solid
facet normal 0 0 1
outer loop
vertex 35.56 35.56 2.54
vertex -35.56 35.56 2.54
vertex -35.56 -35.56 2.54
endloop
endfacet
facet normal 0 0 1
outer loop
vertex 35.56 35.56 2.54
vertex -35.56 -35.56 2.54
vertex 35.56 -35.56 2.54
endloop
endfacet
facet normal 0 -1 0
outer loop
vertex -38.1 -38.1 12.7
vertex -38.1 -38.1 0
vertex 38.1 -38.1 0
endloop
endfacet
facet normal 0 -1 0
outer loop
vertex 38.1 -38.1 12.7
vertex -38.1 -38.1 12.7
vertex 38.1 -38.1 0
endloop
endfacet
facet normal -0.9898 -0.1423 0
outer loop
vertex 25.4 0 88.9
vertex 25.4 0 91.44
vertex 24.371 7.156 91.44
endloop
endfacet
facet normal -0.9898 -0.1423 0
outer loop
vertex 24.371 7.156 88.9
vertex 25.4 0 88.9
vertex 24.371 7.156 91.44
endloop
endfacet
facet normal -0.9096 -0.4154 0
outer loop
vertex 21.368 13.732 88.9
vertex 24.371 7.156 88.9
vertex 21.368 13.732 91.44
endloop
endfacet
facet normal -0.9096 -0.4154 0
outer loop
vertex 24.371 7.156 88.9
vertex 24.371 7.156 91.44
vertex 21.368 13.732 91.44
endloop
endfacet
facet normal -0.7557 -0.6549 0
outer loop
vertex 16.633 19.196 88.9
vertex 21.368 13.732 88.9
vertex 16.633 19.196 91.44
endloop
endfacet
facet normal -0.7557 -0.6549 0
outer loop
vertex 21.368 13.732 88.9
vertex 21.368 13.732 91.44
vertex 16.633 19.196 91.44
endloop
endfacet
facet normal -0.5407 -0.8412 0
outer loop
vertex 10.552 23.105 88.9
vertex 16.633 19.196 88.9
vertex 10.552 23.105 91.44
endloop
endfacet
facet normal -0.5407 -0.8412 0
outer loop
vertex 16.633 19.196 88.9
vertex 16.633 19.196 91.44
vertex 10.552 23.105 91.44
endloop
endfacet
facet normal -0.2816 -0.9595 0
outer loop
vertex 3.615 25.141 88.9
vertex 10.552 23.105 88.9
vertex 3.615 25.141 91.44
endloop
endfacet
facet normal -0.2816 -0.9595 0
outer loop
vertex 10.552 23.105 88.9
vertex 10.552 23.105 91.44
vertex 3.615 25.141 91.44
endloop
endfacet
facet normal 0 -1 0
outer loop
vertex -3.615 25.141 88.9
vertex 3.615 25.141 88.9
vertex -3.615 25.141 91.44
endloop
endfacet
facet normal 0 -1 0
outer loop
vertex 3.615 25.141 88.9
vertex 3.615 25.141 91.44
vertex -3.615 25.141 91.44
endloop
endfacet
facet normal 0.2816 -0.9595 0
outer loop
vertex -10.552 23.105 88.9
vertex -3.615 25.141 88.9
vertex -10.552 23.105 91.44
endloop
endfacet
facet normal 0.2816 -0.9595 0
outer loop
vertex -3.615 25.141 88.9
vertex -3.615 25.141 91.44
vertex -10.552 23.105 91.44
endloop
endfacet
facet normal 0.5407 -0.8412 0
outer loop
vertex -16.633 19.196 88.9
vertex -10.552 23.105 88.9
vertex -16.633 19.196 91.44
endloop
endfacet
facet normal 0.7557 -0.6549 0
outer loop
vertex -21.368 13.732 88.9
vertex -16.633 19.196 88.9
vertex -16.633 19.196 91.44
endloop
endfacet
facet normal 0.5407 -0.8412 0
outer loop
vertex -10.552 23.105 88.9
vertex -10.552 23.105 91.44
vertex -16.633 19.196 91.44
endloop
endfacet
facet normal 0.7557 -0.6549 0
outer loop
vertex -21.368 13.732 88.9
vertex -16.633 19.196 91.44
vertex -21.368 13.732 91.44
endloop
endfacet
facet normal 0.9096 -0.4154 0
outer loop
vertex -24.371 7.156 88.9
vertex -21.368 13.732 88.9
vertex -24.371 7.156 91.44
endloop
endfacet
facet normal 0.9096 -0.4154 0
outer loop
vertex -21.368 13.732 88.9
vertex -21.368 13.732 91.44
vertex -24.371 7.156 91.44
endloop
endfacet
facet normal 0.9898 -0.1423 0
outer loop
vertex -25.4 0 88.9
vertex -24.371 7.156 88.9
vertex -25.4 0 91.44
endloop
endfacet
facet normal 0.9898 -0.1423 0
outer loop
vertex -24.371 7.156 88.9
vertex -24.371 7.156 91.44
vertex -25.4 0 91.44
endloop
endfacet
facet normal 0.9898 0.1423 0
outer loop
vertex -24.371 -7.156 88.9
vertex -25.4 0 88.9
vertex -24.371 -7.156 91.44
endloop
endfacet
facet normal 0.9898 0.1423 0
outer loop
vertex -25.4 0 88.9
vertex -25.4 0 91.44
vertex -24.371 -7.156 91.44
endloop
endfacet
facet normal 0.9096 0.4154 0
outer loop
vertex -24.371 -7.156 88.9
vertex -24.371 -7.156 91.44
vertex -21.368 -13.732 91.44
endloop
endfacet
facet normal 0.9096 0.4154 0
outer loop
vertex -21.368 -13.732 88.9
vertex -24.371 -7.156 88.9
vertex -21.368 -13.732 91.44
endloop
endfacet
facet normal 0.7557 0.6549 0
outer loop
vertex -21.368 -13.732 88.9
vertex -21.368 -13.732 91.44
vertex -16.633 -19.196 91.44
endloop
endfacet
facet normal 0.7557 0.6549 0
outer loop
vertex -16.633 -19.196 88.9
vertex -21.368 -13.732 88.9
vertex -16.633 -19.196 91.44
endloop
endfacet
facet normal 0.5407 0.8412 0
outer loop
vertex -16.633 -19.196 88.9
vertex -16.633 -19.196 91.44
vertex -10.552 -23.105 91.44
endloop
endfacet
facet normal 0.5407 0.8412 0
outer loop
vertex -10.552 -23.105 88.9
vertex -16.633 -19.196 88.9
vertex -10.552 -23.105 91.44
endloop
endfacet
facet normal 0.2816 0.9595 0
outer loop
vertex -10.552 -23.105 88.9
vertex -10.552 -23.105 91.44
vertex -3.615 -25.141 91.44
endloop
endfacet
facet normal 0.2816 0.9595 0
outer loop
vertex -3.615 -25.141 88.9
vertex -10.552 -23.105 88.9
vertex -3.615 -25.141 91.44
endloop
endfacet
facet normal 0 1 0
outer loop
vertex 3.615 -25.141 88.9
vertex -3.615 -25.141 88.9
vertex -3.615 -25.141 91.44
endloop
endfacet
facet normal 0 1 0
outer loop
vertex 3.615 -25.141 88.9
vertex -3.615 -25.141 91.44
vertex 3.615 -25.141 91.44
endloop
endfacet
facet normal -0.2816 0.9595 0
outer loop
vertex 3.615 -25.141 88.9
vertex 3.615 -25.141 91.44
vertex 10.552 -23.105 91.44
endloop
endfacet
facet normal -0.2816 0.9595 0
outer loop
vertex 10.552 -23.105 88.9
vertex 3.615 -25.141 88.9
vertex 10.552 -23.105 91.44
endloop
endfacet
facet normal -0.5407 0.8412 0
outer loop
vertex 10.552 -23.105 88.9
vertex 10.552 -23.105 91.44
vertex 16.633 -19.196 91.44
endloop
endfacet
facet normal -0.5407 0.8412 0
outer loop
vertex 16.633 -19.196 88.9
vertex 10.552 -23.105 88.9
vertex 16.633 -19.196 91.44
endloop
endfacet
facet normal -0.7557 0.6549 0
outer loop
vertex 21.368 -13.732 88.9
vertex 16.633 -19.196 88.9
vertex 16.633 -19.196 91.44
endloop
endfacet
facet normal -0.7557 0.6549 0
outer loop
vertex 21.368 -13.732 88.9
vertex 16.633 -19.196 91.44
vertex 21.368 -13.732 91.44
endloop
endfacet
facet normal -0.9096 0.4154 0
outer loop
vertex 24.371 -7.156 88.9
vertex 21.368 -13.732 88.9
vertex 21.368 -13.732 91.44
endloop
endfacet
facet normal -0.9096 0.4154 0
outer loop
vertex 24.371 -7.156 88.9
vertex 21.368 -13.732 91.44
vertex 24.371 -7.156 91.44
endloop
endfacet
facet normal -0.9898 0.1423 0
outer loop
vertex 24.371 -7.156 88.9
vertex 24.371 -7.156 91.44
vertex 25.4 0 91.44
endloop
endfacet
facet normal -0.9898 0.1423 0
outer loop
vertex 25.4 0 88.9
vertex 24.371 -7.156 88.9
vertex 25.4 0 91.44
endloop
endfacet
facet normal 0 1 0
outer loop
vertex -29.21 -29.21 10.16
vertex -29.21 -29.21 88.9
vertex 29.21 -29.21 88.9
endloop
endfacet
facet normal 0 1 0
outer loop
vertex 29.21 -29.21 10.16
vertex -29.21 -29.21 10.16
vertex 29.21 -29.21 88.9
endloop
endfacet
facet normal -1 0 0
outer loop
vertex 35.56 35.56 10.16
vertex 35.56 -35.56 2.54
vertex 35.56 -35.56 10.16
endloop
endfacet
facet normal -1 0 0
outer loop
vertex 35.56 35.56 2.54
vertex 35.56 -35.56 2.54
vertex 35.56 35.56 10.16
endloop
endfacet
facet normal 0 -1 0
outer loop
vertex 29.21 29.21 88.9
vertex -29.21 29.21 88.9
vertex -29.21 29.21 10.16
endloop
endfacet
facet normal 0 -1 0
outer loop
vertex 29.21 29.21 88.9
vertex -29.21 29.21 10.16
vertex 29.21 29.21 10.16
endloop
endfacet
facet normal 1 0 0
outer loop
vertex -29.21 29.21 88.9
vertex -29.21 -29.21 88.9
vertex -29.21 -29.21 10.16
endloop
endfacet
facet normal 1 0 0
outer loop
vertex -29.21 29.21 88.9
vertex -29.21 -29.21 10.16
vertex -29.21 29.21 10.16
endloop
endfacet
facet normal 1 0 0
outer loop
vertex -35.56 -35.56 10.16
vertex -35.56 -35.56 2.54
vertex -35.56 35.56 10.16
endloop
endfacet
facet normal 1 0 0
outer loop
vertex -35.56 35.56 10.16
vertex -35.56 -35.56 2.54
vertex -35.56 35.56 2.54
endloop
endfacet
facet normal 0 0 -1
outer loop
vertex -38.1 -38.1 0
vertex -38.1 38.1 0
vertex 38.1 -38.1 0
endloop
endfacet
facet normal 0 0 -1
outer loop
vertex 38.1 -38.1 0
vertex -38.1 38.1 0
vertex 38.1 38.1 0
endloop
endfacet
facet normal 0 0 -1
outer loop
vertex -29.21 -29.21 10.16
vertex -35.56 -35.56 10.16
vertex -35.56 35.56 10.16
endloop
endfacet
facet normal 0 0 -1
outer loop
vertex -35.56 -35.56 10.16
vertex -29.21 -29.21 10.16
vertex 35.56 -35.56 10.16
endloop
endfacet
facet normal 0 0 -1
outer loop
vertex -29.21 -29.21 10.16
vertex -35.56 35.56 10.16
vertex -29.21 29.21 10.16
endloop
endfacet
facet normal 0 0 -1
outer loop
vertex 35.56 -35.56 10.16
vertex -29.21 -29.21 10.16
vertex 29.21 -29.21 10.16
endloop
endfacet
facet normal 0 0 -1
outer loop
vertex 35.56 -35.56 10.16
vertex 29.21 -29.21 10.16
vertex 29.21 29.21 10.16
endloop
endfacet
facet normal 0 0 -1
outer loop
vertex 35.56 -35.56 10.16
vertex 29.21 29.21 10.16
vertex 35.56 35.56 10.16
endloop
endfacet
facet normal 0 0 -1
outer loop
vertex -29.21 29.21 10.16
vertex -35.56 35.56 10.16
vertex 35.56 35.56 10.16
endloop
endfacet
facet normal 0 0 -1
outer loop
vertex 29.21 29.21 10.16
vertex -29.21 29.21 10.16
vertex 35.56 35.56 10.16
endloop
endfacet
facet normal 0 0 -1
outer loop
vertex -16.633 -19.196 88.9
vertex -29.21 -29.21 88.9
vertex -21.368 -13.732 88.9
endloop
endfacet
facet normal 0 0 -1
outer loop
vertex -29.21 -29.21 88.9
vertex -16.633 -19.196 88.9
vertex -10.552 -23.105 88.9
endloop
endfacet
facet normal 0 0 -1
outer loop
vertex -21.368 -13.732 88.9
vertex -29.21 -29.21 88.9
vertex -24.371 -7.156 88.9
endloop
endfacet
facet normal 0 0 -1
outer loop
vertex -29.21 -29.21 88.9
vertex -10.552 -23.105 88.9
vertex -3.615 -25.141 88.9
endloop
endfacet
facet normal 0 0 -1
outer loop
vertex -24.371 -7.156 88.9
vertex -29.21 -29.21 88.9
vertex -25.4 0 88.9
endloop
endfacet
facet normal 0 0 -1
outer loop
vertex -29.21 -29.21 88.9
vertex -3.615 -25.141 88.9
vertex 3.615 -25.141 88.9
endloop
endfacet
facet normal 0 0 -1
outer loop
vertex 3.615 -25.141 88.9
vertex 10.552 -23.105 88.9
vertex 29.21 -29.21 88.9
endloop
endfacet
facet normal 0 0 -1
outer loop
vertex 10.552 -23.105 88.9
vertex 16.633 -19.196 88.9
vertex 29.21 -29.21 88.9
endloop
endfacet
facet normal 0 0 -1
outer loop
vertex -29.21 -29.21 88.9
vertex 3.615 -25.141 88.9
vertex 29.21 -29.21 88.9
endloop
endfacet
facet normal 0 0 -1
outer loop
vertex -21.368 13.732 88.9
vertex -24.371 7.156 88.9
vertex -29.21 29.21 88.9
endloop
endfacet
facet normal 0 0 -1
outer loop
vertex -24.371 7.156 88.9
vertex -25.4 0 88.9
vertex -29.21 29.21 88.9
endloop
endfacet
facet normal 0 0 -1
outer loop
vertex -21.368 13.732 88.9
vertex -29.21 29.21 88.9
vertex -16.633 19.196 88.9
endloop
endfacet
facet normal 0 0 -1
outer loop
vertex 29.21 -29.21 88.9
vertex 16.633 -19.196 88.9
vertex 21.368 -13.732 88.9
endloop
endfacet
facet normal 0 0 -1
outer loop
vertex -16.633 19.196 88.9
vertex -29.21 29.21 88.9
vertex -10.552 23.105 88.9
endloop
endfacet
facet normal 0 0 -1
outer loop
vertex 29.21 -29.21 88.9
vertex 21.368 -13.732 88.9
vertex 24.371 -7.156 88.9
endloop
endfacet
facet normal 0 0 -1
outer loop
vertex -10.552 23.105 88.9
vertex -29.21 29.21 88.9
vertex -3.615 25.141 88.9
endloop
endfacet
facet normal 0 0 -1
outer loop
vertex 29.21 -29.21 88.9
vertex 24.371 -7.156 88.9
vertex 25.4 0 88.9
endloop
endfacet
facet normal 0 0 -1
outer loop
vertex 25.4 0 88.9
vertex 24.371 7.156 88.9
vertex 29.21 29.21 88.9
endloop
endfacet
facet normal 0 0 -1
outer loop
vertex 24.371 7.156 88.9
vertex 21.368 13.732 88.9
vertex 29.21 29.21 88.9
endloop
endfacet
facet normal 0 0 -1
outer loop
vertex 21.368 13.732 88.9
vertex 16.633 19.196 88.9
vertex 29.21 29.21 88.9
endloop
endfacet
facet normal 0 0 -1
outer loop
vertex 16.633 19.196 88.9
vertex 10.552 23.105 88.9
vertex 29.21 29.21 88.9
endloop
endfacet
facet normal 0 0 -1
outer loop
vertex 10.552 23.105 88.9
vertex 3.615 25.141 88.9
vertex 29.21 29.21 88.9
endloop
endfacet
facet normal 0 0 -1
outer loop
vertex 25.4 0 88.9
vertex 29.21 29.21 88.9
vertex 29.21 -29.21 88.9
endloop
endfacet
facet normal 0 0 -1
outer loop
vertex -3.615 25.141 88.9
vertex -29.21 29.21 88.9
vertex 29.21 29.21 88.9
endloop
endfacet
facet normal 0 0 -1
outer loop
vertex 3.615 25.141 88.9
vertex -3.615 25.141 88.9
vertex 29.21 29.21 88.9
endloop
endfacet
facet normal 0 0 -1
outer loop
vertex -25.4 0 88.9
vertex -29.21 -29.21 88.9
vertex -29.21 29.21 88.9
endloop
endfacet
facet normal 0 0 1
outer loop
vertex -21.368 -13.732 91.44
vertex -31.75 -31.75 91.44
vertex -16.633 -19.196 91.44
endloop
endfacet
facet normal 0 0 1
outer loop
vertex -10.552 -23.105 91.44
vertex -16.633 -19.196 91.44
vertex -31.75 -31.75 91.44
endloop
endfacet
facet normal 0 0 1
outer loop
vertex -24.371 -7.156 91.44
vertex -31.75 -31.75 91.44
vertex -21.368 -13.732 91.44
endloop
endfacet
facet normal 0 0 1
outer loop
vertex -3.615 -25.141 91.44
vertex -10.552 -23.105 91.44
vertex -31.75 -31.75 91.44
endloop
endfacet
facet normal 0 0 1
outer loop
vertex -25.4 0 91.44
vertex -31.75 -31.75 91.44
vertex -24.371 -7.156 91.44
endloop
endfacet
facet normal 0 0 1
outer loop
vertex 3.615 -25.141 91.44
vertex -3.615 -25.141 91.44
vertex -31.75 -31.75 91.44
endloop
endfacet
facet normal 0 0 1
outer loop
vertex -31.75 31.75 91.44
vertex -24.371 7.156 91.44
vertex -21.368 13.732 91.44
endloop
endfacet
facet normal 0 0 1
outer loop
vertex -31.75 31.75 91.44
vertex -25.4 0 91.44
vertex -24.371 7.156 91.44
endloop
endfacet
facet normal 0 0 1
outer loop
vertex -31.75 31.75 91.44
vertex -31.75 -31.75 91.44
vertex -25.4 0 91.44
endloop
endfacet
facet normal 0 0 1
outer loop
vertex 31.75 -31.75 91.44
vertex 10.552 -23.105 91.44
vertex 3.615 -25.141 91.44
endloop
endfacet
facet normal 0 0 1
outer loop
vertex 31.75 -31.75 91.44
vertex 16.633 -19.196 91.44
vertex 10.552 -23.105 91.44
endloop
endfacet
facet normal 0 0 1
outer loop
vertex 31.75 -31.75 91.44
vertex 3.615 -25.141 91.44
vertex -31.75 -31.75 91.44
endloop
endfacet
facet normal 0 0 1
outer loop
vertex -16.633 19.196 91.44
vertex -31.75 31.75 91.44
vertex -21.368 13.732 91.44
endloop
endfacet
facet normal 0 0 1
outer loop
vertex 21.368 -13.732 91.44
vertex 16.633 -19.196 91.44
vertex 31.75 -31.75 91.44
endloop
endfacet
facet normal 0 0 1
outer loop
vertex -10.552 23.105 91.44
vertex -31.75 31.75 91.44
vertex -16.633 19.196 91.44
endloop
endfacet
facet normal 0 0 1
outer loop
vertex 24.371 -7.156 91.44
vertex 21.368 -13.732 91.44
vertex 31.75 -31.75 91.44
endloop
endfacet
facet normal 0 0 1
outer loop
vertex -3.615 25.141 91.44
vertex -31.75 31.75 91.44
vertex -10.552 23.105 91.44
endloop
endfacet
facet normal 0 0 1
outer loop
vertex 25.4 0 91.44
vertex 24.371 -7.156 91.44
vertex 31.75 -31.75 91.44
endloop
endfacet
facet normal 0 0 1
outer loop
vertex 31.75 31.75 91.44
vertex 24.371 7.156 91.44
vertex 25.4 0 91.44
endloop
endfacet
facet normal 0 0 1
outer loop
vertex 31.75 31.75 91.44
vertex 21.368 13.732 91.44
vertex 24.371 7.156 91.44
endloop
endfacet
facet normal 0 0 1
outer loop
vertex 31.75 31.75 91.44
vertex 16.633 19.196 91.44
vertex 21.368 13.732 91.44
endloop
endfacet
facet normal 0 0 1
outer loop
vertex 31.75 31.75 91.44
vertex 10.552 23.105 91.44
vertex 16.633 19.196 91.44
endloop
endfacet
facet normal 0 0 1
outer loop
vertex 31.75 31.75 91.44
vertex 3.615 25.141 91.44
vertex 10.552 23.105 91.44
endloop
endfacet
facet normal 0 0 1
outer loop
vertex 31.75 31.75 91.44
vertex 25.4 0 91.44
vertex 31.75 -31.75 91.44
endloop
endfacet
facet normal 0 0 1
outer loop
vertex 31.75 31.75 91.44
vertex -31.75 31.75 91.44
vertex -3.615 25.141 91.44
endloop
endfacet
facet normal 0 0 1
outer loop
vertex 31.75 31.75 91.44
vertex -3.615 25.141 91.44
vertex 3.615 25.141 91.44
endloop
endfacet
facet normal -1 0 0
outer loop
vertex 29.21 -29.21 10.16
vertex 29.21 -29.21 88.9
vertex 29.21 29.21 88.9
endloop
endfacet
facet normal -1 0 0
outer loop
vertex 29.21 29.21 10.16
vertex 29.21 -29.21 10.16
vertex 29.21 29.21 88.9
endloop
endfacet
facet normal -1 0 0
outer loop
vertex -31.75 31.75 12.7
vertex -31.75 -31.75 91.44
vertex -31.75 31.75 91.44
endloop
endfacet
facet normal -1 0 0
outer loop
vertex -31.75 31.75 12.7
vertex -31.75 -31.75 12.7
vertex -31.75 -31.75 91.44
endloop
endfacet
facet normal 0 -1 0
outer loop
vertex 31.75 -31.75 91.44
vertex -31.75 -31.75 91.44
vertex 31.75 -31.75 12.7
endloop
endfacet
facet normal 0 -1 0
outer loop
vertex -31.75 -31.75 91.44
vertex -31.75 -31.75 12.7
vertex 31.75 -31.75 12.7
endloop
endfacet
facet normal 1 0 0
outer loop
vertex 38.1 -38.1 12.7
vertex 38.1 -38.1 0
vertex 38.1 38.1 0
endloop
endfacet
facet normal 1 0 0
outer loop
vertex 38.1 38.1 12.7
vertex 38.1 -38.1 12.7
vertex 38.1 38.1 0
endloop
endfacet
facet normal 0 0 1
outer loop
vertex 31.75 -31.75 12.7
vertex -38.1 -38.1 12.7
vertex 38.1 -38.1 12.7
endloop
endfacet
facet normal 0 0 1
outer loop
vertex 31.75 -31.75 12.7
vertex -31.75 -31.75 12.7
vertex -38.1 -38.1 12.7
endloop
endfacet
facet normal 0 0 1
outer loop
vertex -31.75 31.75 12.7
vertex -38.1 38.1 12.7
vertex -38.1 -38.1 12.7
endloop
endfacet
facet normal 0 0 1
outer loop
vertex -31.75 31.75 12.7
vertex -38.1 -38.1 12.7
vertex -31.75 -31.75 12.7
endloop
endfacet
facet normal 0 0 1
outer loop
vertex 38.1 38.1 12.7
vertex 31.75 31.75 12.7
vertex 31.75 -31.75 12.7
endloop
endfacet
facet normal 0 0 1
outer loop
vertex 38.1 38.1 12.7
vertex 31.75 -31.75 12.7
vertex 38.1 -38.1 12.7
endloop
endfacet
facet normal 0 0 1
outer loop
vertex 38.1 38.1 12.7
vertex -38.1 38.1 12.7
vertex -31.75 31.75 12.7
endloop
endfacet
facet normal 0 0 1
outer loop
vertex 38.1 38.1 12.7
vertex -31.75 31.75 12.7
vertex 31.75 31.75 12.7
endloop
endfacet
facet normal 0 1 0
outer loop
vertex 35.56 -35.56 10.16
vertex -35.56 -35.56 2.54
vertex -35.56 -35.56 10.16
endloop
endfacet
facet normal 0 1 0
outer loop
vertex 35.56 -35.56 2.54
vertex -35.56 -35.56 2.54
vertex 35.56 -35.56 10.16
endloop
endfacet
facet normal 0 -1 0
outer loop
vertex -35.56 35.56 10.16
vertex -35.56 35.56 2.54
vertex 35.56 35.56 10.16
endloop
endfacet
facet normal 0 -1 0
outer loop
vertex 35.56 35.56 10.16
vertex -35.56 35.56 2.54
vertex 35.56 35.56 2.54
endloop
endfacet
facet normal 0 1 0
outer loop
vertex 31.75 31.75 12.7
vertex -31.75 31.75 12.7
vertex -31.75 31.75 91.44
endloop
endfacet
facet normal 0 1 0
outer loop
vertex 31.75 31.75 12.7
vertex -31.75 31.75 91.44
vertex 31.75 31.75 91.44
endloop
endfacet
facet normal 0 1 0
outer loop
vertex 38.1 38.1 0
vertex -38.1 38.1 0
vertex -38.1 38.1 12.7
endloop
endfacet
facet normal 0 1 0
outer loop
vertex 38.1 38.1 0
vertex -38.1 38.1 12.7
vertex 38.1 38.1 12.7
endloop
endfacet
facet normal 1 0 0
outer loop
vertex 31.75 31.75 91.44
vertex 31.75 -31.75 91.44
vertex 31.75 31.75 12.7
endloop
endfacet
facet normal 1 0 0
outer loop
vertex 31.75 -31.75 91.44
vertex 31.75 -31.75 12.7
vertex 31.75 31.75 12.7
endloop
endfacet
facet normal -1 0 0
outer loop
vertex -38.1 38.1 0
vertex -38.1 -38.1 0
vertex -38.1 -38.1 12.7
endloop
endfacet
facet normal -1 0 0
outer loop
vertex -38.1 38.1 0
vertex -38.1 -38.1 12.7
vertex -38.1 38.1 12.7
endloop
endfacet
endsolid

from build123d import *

# Parameters (mm, degrees)
F0_W      = 76.2
F0_H      = 76.2
F1_DEPTH  = 12.7
F2_W      = 63.5
F2_H      = 63.5
F3_DEPTH  = 76.2
F6_T      = -2.54
F7_W      = 63.5
F7_H      = 63.5
F8_DEPTH  = 2.54
F9_R      = 25.4
F10_DEPTH = 25.4


# Not quite as in the source:
# - a feature of the source that left no trace in its solid (it failed there, or was rolled back) is left out


with BuildPart() as f1:
    # F0 (on Top) → F1 (new body)
    with BuildSketch(Plane.XY):
        Rectangle(F0_W, F0_H)
    extrude(amount=F1_DEPTH)

    # F2 (on face) → F3 (join)
    with BuildSketch(Plane.XY.offset(12.7)):
        Rectangle(F2_W, F2_H)
    extrude(amount=F3_DEPTH)

    # F6
    f6_openings = [f1.faces().sort_by_distance(p)[0] for p in [
        (0, 0, 88.9),
    ]]
    offset(amount=F6_T, openings=f6_openings, kind=Kind.INTERSECTION)

    # F7 (on face) → F8 (join)
    with BuildSketch(Plane.XY.offset(88.9)):
        Rectangle(F7_W, F7_H)
    extrude(amount=F8_DEPTH)

    # F9 (on face) → F10 (cut)
    with BuildSketch(Plane.XY.offset(91.44)):
        Circle(F9_R)
    extrude(amount=-F10_DEPTH, mode=Mode.SUBTRACT)


solid = f1.part
